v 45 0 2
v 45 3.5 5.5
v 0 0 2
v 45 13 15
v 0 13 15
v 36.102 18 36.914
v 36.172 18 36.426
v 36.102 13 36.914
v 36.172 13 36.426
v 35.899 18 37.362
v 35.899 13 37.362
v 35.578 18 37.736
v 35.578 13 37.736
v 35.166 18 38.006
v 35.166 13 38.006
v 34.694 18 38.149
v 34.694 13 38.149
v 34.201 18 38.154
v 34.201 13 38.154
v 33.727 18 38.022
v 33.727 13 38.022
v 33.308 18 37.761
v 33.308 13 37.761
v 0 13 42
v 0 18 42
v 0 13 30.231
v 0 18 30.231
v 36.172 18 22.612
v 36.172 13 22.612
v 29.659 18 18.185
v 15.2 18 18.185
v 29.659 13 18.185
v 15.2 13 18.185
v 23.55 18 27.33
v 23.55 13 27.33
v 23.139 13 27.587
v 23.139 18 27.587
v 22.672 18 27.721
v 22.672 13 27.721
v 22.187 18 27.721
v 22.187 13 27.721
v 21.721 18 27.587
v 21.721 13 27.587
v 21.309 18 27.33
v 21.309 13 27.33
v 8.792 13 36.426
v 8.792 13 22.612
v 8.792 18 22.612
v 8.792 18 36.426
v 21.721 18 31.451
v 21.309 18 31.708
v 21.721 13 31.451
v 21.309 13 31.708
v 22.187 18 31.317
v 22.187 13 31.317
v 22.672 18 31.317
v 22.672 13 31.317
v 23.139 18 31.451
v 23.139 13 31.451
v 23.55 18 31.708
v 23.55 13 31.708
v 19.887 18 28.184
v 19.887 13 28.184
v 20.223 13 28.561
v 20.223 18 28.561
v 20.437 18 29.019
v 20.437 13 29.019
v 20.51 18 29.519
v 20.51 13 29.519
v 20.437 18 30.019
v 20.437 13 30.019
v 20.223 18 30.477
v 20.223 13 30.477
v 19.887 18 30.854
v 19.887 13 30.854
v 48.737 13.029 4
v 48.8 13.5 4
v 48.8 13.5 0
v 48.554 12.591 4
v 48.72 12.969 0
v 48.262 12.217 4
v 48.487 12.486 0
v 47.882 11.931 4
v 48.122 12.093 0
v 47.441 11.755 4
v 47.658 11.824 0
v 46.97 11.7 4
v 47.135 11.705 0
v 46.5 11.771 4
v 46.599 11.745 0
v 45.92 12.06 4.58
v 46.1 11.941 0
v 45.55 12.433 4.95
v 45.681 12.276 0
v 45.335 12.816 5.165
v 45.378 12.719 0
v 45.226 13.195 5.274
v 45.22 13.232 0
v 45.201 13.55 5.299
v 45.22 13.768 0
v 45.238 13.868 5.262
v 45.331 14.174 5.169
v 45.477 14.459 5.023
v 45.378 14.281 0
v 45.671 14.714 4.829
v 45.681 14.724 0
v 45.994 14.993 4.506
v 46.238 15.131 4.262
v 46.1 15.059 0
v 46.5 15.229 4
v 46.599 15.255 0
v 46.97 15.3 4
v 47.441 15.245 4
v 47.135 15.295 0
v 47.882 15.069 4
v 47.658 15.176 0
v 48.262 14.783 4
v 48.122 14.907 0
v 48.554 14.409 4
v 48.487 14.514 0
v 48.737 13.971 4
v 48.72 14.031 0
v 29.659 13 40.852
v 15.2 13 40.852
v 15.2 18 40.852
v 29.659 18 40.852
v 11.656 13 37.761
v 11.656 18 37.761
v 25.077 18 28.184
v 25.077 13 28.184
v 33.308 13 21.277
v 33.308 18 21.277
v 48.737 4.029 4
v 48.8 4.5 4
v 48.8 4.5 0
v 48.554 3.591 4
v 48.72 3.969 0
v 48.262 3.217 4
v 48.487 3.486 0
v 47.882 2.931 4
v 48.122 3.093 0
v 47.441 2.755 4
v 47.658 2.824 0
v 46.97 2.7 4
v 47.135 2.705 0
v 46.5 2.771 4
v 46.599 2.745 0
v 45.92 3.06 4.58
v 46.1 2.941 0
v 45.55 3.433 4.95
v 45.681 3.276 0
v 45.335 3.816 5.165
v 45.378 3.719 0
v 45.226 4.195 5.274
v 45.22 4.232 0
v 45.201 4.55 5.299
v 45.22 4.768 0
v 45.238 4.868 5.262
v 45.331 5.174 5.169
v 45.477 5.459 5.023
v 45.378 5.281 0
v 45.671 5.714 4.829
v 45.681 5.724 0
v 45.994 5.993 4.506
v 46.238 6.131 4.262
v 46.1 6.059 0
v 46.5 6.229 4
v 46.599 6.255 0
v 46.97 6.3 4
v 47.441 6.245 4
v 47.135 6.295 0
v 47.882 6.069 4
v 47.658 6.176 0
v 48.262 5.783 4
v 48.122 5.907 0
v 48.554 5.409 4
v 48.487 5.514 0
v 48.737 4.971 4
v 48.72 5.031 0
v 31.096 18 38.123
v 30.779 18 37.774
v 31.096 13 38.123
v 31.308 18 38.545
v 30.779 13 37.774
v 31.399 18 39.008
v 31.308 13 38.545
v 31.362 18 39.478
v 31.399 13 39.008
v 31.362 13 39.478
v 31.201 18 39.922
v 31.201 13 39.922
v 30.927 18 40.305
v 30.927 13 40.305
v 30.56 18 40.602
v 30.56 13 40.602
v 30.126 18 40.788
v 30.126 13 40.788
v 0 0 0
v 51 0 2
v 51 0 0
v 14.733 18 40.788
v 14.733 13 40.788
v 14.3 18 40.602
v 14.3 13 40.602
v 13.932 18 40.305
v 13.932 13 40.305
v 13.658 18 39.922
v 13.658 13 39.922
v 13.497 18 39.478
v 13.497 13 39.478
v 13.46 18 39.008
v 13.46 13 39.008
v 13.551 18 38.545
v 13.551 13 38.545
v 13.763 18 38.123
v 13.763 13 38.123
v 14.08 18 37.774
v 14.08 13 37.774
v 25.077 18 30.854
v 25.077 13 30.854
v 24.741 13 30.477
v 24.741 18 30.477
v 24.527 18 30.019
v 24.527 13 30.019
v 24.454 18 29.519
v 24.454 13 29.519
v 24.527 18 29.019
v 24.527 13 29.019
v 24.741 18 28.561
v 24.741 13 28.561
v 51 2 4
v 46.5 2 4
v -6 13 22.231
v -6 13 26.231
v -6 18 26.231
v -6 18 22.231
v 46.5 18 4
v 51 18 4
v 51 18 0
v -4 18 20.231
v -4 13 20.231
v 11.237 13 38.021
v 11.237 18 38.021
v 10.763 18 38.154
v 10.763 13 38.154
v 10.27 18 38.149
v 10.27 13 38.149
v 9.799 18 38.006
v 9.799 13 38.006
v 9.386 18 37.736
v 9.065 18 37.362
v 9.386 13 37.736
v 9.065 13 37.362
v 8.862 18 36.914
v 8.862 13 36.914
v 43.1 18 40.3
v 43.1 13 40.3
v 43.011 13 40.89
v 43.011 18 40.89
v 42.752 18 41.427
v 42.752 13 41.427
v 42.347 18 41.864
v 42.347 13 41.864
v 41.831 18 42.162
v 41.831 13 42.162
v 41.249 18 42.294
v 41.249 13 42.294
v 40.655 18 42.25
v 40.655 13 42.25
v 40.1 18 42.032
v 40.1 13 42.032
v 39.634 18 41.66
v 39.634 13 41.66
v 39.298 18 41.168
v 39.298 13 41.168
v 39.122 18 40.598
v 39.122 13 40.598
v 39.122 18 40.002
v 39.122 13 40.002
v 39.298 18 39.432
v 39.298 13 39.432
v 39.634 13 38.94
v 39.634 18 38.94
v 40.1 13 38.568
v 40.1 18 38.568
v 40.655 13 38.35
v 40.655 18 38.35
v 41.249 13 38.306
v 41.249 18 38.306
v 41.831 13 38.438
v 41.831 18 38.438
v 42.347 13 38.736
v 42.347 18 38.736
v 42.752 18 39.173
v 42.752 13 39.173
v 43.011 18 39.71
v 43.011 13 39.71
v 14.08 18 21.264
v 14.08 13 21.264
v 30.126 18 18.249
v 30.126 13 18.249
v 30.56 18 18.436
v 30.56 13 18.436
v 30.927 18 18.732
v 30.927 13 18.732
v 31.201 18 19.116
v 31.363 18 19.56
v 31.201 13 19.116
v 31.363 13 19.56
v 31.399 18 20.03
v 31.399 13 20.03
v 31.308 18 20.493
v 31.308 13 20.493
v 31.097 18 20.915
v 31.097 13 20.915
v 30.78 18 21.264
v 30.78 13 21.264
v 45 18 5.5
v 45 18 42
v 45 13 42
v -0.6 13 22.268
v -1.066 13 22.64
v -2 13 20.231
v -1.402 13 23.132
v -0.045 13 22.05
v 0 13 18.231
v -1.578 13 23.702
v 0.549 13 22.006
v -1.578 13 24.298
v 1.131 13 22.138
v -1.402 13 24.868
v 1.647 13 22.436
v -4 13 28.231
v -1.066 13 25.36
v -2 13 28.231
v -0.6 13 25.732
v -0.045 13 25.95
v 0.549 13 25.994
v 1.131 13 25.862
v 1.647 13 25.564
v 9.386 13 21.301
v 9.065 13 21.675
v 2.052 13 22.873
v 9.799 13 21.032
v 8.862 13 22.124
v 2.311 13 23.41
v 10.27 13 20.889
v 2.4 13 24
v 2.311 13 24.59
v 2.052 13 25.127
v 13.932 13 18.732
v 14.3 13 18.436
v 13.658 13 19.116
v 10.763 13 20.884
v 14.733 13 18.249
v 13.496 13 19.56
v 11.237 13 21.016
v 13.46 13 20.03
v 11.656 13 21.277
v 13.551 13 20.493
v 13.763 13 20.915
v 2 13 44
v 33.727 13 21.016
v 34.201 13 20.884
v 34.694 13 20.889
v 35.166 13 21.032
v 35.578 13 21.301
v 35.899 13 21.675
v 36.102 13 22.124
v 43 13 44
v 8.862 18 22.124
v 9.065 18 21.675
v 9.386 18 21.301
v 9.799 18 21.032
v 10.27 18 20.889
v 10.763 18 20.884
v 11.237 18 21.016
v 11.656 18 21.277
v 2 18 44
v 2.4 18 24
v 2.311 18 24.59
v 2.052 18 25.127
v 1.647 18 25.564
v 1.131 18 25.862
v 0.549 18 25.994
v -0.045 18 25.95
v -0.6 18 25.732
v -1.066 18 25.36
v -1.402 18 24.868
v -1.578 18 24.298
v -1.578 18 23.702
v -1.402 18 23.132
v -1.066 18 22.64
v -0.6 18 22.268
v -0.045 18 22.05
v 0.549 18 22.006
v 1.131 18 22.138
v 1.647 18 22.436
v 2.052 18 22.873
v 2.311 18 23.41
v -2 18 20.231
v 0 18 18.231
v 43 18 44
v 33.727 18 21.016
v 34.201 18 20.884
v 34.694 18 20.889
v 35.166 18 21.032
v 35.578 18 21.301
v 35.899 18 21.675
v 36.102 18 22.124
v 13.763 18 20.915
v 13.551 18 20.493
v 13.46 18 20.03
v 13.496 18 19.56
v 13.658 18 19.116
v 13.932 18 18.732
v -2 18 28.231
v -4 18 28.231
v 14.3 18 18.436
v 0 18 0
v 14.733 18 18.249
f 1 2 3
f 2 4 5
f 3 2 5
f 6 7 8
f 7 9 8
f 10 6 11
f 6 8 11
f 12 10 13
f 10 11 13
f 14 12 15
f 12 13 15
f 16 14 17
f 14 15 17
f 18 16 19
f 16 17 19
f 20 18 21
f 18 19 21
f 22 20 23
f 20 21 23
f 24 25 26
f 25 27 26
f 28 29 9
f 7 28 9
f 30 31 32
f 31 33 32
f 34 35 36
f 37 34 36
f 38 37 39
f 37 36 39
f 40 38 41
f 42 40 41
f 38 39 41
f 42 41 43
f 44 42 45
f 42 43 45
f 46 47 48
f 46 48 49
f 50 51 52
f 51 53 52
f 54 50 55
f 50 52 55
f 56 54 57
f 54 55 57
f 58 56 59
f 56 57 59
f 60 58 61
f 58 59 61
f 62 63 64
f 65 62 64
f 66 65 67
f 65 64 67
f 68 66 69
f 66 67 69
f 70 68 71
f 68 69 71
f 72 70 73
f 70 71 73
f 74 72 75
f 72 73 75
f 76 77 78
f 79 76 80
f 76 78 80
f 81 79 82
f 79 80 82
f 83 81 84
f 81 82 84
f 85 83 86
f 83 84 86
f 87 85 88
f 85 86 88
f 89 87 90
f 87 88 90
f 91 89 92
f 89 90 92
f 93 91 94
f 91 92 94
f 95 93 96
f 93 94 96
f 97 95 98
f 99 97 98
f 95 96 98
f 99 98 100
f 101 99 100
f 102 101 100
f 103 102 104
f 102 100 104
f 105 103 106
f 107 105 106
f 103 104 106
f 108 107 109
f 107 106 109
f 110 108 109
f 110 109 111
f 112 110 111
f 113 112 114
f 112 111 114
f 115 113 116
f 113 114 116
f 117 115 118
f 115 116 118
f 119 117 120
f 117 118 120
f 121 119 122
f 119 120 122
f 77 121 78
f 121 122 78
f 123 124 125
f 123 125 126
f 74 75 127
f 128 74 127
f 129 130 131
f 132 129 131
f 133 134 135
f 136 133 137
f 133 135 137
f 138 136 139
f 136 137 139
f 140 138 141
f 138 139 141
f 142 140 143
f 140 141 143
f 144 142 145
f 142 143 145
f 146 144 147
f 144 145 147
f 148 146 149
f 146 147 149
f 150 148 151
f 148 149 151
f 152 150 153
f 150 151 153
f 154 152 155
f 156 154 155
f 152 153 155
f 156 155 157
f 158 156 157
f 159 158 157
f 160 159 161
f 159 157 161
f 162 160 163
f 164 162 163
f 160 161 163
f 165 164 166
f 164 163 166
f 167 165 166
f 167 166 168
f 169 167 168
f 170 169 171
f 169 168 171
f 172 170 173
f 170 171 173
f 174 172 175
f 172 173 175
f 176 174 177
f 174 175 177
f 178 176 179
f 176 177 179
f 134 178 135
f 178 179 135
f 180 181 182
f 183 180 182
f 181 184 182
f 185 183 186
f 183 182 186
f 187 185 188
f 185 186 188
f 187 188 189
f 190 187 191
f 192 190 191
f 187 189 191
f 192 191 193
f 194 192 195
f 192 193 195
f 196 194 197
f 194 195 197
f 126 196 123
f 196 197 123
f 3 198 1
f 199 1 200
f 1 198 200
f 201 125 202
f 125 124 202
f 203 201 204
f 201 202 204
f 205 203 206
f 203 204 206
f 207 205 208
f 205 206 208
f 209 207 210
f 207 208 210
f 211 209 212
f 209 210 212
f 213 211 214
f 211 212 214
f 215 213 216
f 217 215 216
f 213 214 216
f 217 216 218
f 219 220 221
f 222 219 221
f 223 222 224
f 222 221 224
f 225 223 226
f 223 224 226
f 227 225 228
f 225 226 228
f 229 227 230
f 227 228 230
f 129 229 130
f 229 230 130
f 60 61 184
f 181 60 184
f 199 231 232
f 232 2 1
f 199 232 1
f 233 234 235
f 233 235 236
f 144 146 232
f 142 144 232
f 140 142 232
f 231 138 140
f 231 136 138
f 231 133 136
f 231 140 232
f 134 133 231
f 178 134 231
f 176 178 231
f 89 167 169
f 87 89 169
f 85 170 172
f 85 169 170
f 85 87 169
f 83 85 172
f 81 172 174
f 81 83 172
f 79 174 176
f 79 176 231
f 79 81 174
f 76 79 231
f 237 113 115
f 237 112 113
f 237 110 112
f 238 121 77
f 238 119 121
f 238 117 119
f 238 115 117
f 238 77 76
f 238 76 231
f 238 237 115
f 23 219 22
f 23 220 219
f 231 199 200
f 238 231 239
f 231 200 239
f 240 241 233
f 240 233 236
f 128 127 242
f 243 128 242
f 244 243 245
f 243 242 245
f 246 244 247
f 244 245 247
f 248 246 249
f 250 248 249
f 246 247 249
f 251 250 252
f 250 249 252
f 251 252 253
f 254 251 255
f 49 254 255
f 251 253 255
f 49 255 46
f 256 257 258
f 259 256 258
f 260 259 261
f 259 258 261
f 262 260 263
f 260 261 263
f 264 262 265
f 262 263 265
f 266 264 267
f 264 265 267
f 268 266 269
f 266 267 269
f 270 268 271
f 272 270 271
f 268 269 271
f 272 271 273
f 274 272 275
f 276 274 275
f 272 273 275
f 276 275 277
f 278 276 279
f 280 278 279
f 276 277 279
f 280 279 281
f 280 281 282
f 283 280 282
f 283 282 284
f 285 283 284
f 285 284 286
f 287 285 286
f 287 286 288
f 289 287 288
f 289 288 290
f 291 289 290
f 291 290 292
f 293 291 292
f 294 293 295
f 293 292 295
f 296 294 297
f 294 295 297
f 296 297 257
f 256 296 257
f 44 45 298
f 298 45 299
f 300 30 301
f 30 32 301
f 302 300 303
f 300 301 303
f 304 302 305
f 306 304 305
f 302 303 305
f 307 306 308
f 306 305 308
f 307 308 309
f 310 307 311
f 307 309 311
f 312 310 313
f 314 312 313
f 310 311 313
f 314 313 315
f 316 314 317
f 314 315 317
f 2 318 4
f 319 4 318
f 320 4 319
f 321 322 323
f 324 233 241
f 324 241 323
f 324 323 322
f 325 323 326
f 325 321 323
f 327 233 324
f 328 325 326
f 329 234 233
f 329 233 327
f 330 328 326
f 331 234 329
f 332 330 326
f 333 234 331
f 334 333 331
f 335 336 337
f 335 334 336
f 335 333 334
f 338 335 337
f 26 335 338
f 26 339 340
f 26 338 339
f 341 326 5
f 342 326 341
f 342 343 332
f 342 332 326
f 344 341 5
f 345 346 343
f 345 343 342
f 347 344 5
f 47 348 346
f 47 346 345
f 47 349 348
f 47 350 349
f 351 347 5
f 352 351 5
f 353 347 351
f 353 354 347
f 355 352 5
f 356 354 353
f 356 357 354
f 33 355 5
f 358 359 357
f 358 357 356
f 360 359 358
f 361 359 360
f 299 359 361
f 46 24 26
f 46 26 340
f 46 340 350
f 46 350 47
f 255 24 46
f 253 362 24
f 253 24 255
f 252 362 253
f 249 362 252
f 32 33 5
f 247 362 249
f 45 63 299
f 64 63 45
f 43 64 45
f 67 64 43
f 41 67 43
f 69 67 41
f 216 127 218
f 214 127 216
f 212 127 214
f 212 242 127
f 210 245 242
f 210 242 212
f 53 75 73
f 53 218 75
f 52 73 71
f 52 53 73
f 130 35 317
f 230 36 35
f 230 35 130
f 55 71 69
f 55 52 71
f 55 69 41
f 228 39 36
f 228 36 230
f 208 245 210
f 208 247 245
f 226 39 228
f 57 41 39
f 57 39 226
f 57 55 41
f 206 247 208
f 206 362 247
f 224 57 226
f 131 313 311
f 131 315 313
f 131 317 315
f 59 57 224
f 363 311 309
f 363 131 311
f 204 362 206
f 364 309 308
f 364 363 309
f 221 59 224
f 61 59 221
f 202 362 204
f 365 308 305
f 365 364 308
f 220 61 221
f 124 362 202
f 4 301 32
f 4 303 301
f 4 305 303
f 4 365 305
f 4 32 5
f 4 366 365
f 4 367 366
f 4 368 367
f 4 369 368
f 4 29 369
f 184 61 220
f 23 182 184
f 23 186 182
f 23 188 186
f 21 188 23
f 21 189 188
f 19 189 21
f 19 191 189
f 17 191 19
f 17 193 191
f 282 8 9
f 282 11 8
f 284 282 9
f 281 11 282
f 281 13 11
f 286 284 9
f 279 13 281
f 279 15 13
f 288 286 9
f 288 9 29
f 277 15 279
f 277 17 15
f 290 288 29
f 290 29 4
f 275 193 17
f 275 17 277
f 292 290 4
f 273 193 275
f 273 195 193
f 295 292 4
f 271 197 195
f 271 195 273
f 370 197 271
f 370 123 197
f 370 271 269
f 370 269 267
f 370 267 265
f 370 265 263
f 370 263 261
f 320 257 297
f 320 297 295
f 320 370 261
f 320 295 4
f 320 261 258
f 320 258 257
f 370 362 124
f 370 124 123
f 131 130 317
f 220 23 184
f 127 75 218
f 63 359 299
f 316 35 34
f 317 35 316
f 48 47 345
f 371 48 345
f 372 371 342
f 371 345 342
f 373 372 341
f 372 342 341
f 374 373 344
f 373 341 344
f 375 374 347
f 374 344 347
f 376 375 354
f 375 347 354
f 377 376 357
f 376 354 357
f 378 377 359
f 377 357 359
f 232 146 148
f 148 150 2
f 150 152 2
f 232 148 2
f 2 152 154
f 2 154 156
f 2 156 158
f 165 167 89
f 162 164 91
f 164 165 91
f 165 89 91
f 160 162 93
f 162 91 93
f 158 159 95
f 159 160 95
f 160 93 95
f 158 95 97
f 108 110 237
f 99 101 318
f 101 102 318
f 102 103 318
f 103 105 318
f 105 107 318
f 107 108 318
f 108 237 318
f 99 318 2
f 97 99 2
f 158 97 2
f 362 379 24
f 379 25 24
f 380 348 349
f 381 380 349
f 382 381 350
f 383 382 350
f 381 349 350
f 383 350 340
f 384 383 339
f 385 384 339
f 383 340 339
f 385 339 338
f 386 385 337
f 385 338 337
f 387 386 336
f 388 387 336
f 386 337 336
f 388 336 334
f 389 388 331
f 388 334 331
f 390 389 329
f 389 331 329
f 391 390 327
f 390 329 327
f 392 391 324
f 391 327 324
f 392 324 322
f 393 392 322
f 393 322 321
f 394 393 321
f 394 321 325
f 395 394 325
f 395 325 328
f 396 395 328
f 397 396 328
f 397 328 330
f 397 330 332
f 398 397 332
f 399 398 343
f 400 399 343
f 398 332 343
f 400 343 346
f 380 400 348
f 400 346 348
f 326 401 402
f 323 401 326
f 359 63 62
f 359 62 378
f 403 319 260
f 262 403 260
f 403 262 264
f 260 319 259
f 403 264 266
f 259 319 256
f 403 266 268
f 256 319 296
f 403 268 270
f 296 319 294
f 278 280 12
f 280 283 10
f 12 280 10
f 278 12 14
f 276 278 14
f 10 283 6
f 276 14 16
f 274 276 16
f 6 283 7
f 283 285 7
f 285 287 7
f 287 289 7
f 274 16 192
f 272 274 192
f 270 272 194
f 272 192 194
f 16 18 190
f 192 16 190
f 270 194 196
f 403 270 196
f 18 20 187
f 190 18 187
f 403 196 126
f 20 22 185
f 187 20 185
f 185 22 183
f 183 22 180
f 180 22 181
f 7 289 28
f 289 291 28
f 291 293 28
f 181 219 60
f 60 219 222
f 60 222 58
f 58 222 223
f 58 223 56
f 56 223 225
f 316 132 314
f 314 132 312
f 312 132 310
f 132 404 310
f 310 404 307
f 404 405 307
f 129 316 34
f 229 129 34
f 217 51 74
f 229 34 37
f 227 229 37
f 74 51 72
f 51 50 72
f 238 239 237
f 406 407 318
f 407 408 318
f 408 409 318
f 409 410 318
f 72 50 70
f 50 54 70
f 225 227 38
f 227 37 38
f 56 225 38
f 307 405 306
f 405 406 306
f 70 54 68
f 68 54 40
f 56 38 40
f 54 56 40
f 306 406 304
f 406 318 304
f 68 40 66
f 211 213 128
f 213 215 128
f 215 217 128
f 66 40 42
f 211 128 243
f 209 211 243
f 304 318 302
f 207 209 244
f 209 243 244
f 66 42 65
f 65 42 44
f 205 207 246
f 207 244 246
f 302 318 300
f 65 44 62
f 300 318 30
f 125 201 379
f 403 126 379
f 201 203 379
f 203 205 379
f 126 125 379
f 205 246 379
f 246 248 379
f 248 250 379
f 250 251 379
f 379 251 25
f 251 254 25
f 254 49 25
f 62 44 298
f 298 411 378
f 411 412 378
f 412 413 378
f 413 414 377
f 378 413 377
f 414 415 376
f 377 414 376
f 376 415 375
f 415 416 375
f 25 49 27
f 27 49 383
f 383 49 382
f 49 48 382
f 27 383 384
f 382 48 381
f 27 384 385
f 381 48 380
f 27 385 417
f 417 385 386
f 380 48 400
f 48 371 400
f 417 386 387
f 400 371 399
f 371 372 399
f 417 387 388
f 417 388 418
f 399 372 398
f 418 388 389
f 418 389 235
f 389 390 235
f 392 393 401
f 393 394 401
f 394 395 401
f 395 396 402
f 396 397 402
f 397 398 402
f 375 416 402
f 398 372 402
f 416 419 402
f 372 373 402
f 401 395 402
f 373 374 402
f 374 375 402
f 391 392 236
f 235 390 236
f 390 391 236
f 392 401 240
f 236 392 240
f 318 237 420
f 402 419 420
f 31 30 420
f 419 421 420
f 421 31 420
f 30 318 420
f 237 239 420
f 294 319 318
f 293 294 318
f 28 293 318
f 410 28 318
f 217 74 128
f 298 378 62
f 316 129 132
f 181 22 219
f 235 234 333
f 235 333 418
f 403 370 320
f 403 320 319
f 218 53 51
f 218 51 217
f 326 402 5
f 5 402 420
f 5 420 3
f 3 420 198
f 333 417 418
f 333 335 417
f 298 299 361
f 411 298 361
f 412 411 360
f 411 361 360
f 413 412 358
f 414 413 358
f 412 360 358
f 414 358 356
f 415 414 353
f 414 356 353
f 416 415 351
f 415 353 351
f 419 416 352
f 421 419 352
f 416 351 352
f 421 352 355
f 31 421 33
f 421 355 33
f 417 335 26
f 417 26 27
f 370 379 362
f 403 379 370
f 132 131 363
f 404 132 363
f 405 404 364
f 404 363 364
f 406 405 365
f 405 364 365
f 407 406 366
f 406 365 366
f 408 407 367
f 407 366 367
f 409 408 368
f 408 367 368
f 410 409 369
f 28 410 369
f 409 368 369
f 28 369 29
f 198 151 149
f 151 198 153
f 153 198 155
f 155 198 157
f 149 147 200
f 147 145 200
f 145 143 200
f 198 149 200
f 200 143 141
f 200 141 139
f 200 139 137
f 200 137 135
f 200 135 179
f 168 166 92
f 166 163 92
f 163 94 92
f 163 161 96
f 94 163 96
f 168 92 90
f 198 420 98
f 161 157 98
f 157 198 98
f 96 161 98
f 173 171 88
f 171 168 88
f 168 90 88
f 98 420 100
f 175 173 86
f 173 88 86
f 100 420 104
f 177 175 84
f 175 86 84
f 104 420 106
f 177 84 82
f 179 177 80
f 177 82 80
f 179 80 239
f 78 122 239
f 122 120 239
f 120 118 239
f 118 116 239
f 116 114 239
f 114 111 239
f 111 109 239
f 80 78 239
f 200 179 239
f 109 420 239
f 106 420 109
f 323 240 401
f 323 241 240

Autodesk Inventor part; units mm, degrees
sketch "スケッチ1" plane through (0, 0, 0) normal (0, 0, 1) x (1, 0, 0)
  line L0 (0, 0) -> (51, 0)
  line L1 (51, 0) -> (51, 18)
  line L2 (51, 18) -> (0, 18)
  line L3 (0, 18) -> (0, 0)
  circle A0 centre (47, 13.5) radius 1.8
  circle A1 centre (47, 4.5) radius 1.8
  dimension "d0" = 51
  dimension "d1" = 18
  dimension "d4" = 3.6
  dimension "d5" = 13.5
  dimension "d6" = 4
  dimension "d7" = 3.6
  dimension "d8" = 4
  dimension "d9" = 4.5
extrude "押し出し2" add sketch "スケッチ1" along normal blind 2
sketch "スケッチ2" plane through (0, 0, 2) normal (0, 0, 1) x (1, 0, 0)
  line L0 (0, 18) -> (0, 0) projected
  line L1 (0, 18) -> (44, 18)
  line L2 (44, 18) -> (44, 13)
  line L3 (44, 13) -> (0, 13)
  line L4 (0, 13) -> (0, 18)
  dimension "d12" = 44
  dimension "d13" = 5
extrude "押し出し3" add sketch "スケッチ2" along normal blind 42
sketch "スケッチ3" plane through (0, 13, 2) normal (0, -1, 0) x (1, 0, 0)
  circle A0 centre (41.1, 3.5) radius 2
  line L0 (44, 0) -> (44, 42) projected
  line L1 (44, 0) -> (0, 0) projected
  circle A1 centre (0.4, 19.8) radius 2
  point P0 (0, -2)
  dimension "d16" = 4
  dimension "d17" = 2.9
  dimension "d18" = 3.5
  dimension "d27" = 4
  dimension "d28" = 40.7
  dimension "d29" = 16.3
sketch "スケッチ4" plane through (0, 13, 2) normal (0, -1, 0) x (1, 0, 0)
  line L0 (8, 13.3) -> (-4, 13.3)
  line L1 (-4, 13.3) -> (-4, 24.3)
  line L2 (-4, 24.3) -> (8, 24.3)
  line L3 (8, 24.3) -> (8, 13.3)
  line L4 (44, 0) -> (0, 0) projected
  line L5 (44, 0) -> (44, 42) projected
  line L6 (0, 42) -> (44, 42) projected
  line L7 (0, 0) -> (0, 42) projected
  point P0 (0, -2)
  dimension "d19" = 13.3
  dimension "d20" = 36
  dimension "d25" = 11
  dimension "d26" = 12
ref_plane "作業平面2" through (-4, 15.3, 26.3) normal (0, -1, 0) x (1, 0, 0)
sketch "スケッチ5" plane through (-4, 15.3, 26.3) normal (0, -1, 0) x (1, 0, 0)
  point P0 (4, -26.3)
ref_plane "作業平面1" through (-4, 15.3, 26.3) normal (0, -1, 0) x (1, 0, 0)
sketch "スケッチ6" plane through (-4, 15.3, 26.3) normal (0, -1, 0) x (1, 0, 0)
  line L0 (4, -24.3) -> (4, 17.7) projected
  circle A0 centre (4.4, -2.3) radius 2
  circle A1 centre (45.1, 14) radius 2
  line L1 (4, -24.3) -> (55, -24.3) projected
  line L2 (48, -24.3) -> (48, 17.7) projected
  line L3 (4, 17.7) -> (48, 17.7) projected
  point P0 (4, -26.3)
  dimension "d45" = 4
  dimension "d46" = 0.4
  dimension "d47" = 4
  dimension "d48" = 22
  dimension "d49" = 2.9
  dimension "d67" = 43.8427
sketch "スケッチ7" plane through (0, 13, 2) normal (0, -1, 0) x (1, 0, 0)
  point P0 (0, -2)
sketch "スケッチ8" plane through (0, 13, 2) normal (0, -1, 0) x (1, 0, 0)
  line L0 (44, 0) -> (44, 42) projected
  line L1 (44, 0) -> (45, 0)
  line L2 (45, 0) -> (45, 21.3)
  line L3 (45, 21.3) -> (44, 21.3)
  line L4 (44, 21.3) -> (44, 0)
  point P0 (0, -2)
  dimension "d35" = 1
extrude "押し出し6" add sketch "スケッチ8" against normal blind 5
ref_plane "作業平面3" through (45, 13, 3) normal (0, -1, 0) x (1, 0, 0)
sketch "スケッチ9" plane through (45, 13, 3) normal (0, -1, 0) x (1, 0, 0)
  line L0 (-51, 17.2309) -> (-43, 17.2309)
  line L1 (-43, 17.2309) -> (-43, 25.2309)
  line L2 (-43, 25.2309) -> (-51, 25.2309)
  line L3 (-51, 25.2309) -> (-51, 17.2309)
  line L4 (0, 41) -> (-10, 41)
  line L5 (-10, 41) -> (-10, 7.258)
  line L6 (-10, 7.258) -> (0, 7.258)
  line L7 (0, 7.258) -> (0, 41)
  line L8 (0, 16.7) -> (0, 41)
  line L9 (-45, -1) -> (6, -1) projected
  point P0 (-45, -3)
  point P1 (-45, 4.4596)
  point P2 (-2.5771, 20.3)
  dimension "d55" = 8
  dimension "d59" = 0
  dimension "d97" = 18.2309
  dimension "d98" = 8.258
  dimension "d99" = 33.742
extrude "押し出し8" add sketch "スケッチ9" against normal blind 5
extrude "押し出し9" cut sketch "スケッチ6" along normal mid plane 10 contours A0 L0 | L0 A0 | A1
chamfer "面取り5" distance 13 angle 45 1 edges at (22.5, 13, 2)
sketch "スケッチ10" plane through (0, 0, 2) normal (0, 0, 1) x (1, 0, 0)
  line L0 (45, 18) -> (45, 0) projected
  line L1 (45, 0) -> (51, 0) projected
  line L2 (51, 0) -> (51, 18) projected
  line L3 (51, 18) -> (45, 18) projected
  circle A0 centre (47, 13.5) radius 1.8 projected
  circle A1 centre (47, 4.5) radius 1.8 projected
  circle A2 centre (47, 4.5) radius 1.8
  circle A3 centre (47, 13.5) radius 1.8
  line L4 (45, 0) -> (51, 0)
  line L5 (51, 0) -> (51, 18)
  line L6 (51, 18) -> (45, 18)
  line L7 (45, 18) -> (45, 0)
  point P0 (0, 0)
extrude "押し出し10" add sketch "スケッチ10" along normal blind 2
chamfer "面取り6" distance 2 angle 45 1 edges at (48, 0, 4)
chamfer "面取り7" distance 1.5 angle 45 1 edges at (45, 10.0001, 4)
chamfer "面取り8" distance 2 angle 45 4 edges at (45, 15.5, 44) (0, 15.5, 44) (-6, 15.5, 20.2309) (-6, 15.5, 28.2309)
sketch "スケッチ11" plane through (0, 13, 15) normal (0, -1, 0) x (1, 0, 0)
  line L0 (45, 0) -> (45, 27) projected
  line L1 (45, 13.5) -> (35.6998, 13.5)
  line L2 (19.8872, 15.8543) -> (11.6558, 22.7612)
  line L3 (21.4786, 14.5189) -> (32.2238, 14.5189) construction
  line L4 (19.8872, 13.1836) -> (11.6558, 6.2766)
  line L5 (21.4786, 14.5189) -> (32.2239, 14.5189) construction
  line L6 (8.7921, 7.612) -> (8.7921, 21.4259)
  arc A0 (11.6558, 22.7612) -> (8.7921, 21.4259) centre (10.5353, 21.4258) ccw
  arc A1 (19.8872, 13.1836) -> (19.8872, 15.8543) centre (18.7667, 14.5189) ccw
  arc A2 (8.7921, 7.612) -> (11.6558, 6.2766) centre (10.5353, 7.612) ccw
  line L7 (25.0769, 15.8544) -> (33.3082, 22.7613)
  line L8 (25.0769, 13.1835) -> (33.3082, 6.2766)
  line L9 (36.1721, 7.612) -> (36.1721, 21.4258)
  arc A3 (36.1721, 21.4258) -> (33.3082, 22.7613) centre (34.4288, 21.4258) ccw
  arc A4 (25.0769, 15.8544) -> (25.0769, 13.1835) centre (26.1975, 14.5189) ccw
  arc A5 (33.3082, 6.2766) -> (36.1721, 7.612) centre (34.4288, 7.612) ccw
  line L10 (23.55, 16.7078) -> (30.7794, 22.774)
  line L11 (23.8988, 16.5352) -> (33.3361, 16.5352) construction
  line L12 (21.3092, 16.7078) -> (14.0798, 22.774)
  line L13 (23.8988, 16.5352) -> (33.3361, 16.5352) construction
  line L14 (15.2002, 25.8522) -> (29.659, 25.8522)
  arc A6 (21.3092, 16.7078) -> (23.55, 16.7078) centre (22.4296, 18.043) ccw
  arc A7 (15.2002, 25.8522) -> (14.0798, 22.774) centre (15.2002, 24.1092) ccw
  arc A8 (30.7794, 22.774) -> (29.659, 25.8522) centre (29.659, 24.1092) ccw
  line L15 (23.5502, 12.3302) -> (30.7795, 6.2641)
  line L16 (21.309, 12.3302) -> (14.0797, 6.2641)
  line L17 (15.2003, 3.1853) -> (29.6589, 3.1853)
  arc A9 (23.5502, 12.3302) -> (21.309, 12.3302) centre (22.4296, 10.9947) ccw
  arc A10 (14.0797, 6.2641) -> (15.2003, 3.1853) centre (15.2003, 4.9286) ccw
  arc A11 (29.6589, 3.1853) -> (30.7795, 6.2641) centre (29.6589, 4.9286) ccw
  point P0 (0, -15)
  point P1 (8.7921, 25.1641)
  point P2 (8.792, 3.8737)
  point P3 (23.4854, 14.5189)
  point P4 (36.1721, 25.1643)
  point P5 (36.1721, 3.8735)
  point P6 (35.918, 26.6205)
  point P7 (11.8795, 26.6205)
  point P8 (21.9006, 14.5189)
  dimension "d82" = 16.561
  dimension "d83" = 140
  dimension "d84" = 16.5611
  dimension "d85" = 140
  dimension "d86" = 1.7432
  dimension "d87" = 15.69
  dimension "d88" = 40
  dimension "d89" = 15.69
  dimension "d90" = 140
  dimension "d91" = 1.743
extrude "押し出し11" cut sketch "スケッチ11" against normal blind 5
chamfer "面取り9" distance 2 angle 45 2 edges at (0, 15.5, 28.2309) (0, 15.5, 20.2309)
properties part number "PingCover-y" material "ABS プラスチック"
